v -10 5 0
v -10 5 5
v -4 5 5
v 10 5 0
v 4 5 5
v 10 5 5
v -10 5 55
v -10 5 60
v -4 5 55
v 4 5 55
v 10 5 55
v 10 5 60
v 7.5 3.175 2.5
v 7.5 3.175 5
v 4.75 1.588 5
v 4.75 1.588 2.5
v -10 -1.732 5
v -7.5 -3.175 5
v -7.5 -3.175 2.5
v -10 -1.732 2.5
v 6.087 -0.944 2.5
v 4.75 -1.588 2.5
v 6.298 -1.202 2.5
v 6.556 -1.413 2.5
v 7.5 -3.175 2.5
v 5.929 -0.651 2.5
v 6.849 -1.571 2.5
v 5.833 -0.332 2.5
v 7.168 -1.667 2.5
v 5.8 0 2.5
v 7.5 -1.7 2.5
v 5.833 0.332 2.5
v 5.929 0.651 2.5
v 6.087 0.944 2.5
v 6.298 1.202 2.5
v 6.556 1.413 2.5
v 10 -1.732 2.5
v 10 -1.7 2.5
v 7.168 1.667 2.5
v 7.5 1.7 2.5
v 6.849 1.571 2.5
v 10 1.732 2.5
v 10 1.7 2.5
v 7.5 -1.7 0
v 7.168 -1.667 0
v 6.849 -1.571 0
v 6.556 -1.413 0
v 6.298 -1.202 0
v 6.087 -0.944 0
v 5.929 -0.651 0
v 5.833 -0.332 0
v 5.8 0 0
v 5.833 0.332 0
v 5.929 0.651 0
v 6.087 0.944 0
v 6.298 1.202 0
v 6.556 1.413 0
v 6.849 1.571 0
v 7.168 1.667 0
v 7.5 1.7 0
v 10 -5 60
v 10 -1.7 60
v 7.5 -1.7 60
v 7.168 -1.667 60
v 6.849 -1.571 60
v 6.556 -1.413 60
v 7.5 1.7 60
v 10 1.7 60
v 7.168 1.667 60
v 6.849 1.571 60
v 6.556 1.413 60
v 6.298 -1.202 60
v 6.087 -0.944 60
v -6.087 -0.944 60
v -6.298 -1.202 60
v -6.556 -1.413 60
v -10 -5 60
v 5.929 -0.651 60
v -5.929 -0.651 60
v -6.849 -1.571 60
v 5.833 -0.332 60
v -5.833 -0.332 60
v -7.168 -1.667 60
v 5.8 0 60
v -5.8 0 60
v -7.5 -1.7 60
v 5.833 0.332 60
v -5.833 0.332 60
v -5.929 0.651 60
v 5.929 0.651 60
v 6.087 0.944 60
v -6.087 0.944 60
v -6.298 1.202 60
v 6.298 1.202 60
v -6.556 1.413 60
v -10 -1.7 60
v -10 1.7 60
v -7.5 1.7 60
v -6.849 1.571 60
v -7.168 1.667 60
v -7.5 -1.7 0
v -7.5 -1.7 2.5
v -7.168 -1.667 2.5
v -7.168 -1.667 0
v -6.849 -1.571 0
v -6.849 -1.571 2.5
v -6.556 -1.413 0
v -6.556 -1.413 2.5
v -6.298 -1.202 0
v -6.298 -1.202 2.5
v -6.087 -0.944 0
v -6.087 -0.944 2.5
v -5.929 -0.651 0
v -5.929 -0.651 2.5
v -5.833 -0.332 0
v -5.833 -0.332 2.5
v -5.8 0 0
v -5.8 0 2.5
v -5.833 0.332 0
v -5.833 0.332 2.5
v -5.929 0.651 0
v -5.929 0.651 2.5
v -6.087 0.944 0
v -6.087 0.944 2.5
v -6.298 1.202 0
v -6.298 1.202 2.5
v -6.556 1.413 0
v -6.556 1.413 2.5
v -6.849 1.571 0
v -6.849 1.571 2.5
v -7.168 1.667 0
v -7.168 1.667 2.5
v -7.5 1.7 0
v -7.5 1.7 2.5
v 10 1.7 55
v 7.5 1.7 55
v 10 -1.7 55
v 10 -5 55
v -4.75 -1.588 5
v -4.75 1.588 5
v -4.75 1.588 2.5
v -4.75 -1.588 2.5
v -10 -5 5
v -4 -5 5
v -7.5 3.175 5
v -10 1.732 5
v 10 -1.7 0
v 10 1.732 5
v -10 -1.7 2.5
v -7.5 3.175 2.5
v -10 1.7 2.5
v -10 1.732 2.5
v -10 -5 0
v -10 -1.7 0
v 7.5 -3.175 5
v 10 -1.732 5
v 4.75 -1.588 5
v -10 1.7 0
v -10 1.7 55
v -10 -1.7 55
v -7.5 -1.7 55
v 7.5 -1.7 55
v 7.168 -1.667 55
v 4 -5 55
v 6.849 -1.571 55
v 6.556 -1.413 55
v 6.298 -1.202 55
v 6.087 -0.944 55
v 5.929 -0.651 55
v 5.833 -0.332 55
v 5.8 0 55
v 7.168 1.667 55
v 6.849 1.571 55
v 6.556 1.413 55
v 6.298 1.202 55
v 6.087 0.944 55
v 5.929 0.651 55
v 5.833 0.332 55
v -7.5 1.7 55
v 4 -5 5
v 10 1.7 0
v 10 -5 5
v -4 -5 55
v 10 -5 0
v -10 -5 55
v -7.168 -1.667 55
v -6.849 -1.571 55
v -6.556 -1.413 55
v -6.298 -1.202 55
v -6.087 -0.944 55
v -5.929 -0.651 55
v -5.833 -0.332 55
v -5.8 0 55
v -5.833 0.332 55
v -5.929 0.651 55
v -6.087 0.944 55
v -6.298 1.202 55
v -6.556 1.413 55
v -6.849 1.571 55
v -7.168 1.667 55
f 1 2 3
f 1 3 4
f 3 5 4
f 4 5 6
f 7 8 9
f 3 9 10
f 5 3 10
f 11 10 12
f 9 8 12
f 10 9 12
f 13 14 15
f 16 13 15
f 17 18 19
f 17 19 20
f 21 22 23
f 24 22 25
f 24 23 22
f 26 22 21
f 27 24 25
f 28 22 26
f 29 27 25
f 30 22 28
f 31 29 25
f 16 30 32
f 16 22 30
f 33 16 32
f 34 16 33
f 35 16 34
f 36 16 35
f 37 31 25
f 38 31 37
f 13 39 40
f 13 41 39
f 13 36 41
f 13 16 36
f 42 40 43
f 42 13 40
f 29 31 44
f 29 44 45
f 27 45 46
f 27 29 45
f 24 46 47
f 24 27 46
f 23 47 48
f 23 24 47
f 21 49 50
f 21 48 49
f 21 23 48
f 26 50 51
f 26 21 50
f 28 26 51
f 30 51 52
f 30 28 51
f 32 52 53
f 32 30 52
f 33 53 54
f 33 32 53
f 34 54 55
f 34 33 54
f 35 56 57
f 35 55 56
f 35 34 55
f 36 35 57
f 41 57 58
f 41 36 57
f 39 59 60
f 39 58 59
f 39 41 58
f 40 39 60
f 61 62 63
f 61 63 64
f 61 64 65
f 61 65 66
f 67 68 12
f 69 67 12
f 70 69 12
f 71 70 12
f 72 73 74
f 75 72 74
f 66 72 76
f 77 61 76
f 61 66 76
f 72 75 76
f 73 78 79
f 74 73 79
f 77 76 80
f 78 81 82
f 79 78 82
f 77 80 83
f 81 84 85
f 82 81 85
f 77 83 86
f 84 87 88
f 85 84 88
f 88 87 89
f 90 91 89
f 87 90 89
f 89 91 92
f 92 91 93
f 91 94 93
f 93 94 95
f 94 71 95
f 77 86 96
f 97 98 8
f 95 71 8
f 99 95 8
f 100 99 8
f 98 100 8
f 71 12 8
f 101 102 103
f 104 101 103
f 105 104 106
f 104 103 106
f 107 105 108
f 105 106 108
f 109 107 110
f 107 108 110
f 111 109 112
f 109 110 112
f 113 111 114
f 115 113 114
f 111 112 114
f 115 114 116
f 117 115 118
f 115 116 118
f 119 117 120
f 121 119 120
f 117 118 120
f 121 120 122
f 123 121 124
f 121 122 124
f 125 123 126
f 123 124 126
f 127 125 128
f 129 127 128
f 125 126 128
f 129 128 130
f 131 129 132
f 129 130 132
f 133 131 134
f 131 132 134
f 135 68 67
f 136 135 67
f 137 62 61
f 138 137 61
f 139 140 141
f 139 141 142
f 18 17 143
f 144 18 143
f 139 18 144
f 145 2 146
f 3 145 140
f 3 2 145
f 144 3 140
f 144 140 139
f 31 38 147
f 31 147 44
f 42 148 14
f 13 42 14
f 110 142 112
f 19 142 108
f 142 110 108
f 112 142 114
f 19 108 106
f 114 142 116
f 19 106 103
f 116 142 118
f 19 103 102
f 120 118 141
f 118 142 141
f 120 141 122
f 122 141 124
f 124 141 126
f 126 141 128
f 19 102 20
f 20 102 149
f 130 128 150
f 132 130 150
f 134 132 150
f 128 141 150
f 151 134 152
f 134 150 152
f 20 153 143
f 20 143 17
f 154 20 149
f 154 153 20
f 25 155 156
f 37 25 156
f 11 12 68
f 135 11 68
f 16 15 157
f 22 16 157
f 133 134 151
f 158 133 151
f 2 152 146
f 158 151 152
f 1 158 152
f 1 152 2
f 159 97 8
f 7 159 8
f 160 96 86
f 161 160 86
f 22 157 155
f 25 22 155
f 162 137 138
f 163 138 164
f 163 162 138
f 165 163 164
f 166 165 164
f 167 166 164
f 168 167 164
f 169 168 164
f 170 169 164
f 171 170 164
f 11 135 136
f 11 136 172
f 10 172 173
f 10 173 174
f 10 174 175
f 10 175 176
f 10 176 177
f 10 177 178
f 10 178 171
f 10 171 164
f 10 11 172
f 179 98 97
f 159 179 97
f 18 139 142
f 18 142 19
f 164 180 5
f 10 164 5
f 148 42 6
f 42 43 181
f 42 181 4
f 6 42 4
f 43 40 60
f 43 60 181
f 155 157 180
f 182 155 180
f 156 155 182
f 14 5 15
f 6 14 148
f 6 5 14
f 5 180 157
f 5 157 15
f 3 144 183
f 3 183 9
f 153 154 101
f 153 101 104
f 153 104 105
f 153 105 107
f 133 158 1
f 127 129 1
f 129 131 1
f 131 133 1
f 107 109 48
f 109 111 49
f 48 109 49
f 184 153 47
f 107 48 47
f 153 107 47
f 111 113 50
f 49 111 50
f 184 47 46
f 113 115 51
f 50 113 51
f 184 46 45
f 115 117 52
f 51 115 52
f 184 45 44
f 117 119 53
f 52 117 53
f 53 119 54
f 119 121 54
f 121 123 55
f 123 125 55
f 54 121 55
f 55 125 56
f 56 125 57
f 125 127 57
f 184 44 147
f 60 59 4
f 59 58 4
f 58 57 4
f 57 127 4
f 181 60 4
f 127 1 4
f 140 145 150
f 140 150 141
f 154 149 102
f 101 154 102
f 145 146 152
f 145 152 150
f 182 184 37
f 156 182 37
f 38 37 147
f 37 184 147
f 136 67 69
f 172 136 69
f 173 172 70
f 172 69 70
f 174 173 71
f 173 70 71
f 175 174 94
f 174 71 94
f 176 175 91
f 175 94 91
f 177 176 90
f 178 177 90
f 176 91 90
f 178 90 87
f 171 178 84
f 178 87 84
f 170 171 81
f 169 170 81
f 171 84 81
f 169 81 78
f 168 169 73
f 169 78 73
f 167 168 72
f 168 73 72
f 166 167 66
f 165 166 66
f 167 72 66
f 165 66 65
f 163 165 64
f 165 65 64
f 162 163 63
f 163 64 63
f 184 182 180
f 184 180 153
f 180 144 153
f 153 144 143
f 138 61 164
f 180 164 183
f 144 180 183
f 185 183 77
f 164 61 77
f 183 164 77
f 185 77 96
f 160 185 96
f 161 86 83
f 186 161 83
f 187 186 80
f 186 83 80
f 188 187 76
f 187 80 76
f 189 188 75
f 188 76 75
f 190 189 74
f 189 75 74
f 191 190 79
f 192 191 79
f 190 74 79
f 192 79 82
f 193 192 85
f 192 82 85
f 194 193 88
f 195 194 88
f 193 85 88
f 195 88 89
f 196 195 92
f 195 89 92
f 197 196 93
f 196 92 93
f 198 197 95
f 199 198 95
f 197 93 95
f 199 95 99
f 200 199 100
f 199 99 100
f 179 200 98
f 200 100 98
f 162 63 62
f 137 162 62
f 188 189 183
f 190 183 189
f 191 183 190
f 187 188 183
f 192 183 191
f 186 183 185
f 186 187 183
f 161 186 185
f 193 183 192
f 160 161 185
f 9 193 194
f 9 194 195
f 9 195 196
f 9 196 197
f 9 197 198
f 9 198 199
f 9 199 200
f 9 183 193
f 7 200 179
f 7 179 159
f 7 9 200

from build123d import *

# Parameters (mm, degrees)
SKETCH1_W           = 20
SKETCH1_H           = 10
BOSS_EXTRUDE1_DEPTH = 5
SKETCH2_W           = 8
SKETCH2_H           = 10
BOSS_EXTRUDE2_DEPTH = 50
CUT_EXTRUDE1_DEPTH  = 10
BOSS_EXTRUDE3_START = 5
BOSS_EXTRUDE3_DEPTH = 5
CUT_EXTRUDE2_DEPTH  = 2.5


with BuildPart() as part:
    # Sketch1 → Boss-Extrude1 (new body)
    with BuildSketch(Plane.XY):
        Rectangle(SKETCH1_W, SKETCH1_H)
    extrude(amount=BOSS_EXTRUDE1_DEPTH)

    # Sketch2 → Boss-Extrude2 (add)
    with BuildSketch(Plane.XY.offset(5)):
        Rectangle(SKETCH2_W, SKETCH2_H)
    extrude(amount=BOSS_EXTRUDE2_DEPTH)

    # Sketch3 → Cut-Extrude1 (cut)
    with BuildSketch(Plane.XY.offset(5)):
        with BuildLine():
            Line((-7.5, 1.7), (-10, 1.7))
            Line((-10, 1.7), (-10, -1.7))
            Line((-10, -1.7), (-7.5, -1.7))
            ThreePointArc((-7.5, -1.7), (-5.8, 0), (-7.5, 1.7))
        make_face()
        with BuildLine():
            Line((7.5, 1.7), (10, 1.7))
            Line((10, 1.7), (10, -1.7))
            Line((10, -1.7), (7.5, -1.7))
            ThreePointArc((7.5, -1.7), (5.8, 0), (7.5, 1.7))
        make_face()
    extrude(amount=-CUT_EXTRUDE1_DEPTH, mode=Mode.SUBTRACT)

    # Sketch4 → Boss-Extrude3 (add)
    with BuildSketch(Plane.XY.offset(55).offset(BOSS_EXTRUDE3_START)):
        with BuildLine():
            Line((-7.5, 1.7), (-10, 1.7))
            Line((-10, 1.7), (-10, 5))
            Line((-10, 5), (10, 5))
            Line((10, 5), (10, 1.7))
            Line((10, 1.7), (7.5, 1.7))
            ThreePointArc((7.5, 1.7), (5.8, 0), (7.5, -1.7))
            Line((7.5, -1.7), (10, -1.7))
            Line((10, -1.7), (10, -5))
            Line((10, -5), (-10, -5))
            Line((-10, -5), (-10, -1.7))
            Line((-10, -1.7), (-7.5, -1.7))
            ThreePointArc((-7.5, -1.7), (-5.8, 0), (-7.5, 1.7))
        make_face()
    extrude(amount=-BOSS_EXTRUDE3_DEPTH)

    # Sketch5 → Cut-Extrude2 (cut)
    with BuildSketch(Plane.XY.offset(5)):
        Polygon((-4.75, 1.58771324), (-4.75, -1.58771324), (-7.5, -3.175426481), (-10.25, -1.58771324), (-10.25, 1.58771324), (-7.5, 3.175426481), align=None)
    cut_extrude2 = extrude(amount=-CUT_EXTRUDE2_DEPTH, mode=Mode.SUBTRACT)

    # Mirror1: Cut-Extrude2 across plane
    add(cut_extrude2.mirror(Plane(origin=(0, 0, 0), x_dir=(0, 0, 1), z_dir=(1, 0, 0))), mode=Mode.SUBTRACT)


solid = part.part
